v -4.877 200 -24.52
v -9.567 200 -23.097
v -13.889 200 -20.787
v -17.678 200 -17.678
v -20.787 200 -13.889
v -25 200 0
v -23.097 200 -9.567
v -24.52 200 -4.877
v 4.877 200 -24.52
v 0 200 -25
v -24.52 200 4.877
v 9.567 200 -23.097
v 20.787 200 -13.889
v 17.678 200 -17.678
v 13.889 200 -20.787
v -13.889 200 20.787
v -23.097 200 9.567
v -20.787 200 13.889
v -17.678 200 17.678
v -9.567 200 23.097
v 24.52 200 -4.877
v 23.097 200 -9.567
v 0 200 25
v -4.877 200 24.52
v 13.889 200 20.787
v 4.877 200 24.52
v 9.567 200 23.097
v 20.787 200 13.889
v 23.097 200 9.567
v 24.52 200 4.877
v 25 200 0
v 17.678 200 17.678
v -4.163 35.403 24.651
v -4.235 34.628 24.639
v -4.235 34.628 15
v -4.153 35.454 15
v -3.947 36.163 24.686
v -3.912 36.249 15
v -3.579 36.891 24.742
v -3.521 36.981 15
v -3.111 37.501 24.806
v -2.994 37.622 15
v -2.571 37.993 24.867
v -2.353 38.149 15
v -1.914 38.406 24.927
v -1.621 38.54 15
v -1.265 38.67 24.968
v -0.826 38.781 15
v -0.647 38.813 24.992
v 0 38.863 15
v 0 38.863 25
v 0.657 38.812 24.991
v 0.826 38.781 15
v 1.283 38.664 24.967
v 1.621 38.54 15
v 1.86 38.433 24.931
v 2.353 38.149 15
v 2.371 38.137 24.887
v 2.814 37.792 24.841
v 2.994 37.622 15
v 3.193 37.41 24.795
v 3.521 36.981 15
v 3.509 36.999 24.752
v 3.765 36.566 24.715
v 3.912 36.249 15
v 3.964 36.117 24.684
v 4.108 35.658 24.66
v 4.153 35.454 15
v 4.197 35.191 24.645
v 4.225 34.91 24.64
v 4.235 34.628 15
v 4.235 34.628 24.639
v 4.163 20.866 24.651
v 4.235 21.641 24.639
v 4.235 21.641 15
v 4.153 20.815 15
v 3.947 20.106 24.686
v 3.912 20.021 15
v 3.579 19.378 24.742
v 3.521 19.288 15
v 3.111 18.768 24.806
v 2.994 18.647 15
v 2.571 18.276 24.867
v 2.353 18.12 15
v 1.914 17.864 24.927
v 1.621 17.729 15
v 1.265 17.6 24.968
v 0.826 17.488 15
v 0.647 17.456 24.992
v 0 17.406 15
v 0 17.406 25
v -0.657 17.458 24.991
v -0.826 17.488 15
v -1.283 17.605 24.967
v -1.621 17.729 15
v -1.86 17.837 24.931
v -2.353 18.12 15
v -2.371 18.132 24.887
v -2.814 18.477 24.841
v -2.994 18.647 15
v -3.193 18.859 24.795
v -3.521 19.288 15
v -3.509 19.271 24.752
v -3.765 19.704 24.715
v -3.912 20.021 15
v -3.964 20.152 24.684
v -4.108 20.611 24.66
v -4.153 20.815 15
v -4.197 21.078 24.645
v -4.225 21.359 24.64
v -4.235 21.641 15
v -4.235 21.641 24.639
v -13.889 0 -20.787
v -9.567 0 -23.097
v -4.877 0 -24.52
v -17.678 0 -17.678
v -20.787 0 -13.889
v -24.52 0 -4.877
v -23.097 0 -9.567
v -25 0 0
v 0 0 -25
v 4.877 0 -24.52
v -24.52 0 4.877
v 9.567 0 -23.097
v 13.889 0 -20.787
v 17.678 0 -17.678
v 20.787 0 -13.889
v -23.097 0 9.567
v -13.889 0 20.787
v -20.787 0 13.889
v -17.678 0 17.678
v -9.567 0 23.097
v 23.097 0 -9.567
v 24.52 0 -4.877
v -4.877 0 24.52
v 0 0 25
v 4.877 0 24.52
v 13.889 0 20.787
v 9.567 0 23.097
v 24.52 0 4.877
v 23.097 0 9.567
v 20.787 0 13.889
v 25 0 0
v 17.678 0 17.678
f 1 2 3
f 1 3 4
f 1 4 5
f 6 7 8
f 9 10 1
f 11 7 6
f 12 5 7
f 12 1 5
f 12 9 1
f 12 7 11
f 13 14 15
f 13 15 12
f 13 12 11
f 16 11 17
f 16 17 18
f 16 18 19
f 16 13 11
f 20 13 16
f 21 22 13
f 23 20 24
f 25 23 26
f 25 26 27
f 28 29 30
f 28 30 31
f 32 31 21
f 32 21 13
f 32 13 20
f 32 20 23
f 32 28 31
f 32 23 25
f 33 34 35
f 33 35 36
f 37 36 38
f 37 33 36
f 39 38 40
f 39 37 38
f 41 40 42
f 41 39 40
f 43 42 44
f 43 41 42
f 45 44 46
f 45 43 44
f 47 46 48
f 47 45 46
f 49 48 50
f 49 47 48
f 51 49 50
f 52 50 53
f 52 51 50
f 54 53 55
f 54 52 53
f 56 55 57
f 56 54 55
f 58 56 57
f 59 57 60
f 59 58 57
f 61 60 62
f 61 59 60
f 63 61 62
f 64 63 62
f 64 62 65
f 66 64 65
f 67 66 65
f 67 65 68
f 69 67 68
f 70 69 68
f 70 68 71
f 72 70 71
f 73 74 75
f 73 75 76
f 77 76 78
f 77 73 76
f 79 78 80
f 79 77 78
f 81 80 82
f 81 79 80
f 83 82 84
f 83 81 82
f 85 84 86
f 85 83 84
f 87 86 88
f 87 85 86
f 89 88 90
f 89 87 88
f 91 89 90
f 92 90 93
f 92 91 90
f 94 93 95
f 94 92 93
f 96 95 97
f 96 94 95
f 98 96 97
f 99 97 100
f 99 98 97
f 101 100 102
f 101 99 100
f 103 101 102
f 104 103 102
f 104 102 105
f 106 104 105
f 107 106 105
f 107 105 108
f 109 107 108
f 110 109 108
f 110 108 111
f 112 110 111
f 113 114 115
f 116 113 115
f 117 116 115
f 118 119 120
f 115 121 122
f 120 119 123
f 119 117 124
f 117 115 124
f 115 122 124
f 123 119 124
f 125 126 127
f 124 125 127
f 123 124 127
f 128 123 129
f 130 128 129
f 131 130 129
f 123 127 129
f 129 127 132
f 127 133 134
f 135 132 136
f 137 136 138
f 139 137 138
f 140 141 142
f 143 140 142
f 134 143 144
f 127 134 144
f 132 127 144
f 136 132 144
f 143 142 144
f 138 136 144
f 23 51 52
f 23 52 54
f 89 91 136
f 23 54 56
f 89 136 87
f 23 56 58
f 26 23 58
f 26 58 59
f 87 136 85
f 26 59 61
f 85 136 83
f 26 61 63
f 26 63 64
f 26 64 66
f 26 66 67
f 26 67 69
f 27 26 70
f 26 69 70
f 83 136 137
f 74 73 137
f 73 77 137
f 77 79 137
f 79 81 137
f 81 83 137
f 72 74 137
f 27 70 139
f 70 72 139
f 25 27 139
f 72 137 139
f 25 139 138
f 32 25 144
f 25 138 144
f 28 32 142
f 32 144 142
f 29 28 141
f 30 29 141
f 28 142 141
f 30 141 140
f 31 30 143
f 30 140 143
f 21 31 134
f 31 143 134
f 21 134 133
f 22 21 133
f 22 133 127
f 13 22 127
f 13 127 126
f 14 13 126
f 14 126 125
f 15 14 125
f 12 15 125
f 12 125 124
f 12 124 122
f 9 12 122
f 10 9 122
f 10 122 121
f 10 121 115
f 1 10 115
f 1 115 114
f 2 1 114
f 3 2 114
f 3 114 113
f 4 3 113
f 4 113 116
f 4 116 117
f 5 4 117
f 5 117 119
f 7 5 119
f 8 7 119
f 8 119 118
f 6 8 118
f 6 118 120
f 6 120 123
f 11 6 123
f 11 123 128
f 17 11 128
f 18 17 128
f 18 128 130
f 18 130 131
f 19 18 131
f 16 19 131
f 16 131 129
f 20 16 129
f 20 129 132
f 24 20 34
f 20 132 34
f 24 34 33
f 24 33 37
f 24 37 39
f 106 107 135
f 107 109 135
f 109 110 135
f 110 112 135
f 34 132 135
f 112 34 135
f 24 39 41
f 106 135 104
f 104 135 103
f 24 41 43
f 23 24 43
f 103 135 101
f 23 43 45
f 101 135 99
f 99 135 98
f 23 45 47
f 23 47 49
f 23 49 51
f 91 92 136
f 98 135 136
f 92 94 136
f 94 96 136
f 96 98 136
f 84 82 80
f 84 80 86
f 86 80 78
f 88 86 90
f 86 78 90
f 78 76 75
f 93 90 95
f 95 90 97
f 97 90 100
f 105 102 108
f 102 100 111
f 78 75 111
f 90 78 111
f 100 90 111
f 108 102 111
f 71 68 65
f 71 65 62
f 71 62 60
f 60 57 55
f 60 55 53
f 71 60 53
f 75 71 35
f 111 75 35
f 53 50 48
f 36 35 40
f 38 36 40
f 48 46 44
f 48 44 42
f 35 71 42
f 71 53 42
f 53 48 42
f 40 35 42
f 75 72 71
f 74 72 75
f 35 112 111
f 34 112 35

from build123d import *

# Parameters (mm, degrees)
SKIZZE1_R                       = 25
AUFSATZ_LINEAR_AUSTRAGEN1_DEPTH = 200
SCHNITT_LINEAR_AUSTRAGEN1_DEPTH = 10


with BuildPart() as part:
    # Skizze1 → Aufsatz-Linear austragen1 (new body)
    with BuildSketch(Plane(origin=(0, 0, 0), x_dir=(1, 0, 0), z_dir=(0, 1, 0))):
        with Locations(Location((0, 0, 0), (0, 0, 270))):  # turned: the seam where the file's is
            Circle(SKIZZE1_R)
    extrude(amount=AUFSATZ_LINEAR_AUSTRAGEN1_DEPTH)

    # Skizze2 → Schnitt-Linear austragen1 (cut)
    with BuildSketch(Plane.XY.offset(25)):
        with BuildLine():
            Line((-4.234822954, 21.641230775), (-4.234822954, 34.628021169))
            ThreePointArc((-4.234822954, 34.628021169), (0, 38.862844123), (4.234822954, 34.628021169))
            Line((4.234822954, 34.628021169), (4.234822954, 21.641230775))
            ThreePointArc((4.234822954, 21.641230775), (0, 17.406407821), (-4.234822954, 21.641230775))
        make_face()
    extrude(amount=-SCHNITT_LINEAR_AUSTRAGEN1_DEPTH, mode=Mode.SUBTRACT)


solid = part.part
